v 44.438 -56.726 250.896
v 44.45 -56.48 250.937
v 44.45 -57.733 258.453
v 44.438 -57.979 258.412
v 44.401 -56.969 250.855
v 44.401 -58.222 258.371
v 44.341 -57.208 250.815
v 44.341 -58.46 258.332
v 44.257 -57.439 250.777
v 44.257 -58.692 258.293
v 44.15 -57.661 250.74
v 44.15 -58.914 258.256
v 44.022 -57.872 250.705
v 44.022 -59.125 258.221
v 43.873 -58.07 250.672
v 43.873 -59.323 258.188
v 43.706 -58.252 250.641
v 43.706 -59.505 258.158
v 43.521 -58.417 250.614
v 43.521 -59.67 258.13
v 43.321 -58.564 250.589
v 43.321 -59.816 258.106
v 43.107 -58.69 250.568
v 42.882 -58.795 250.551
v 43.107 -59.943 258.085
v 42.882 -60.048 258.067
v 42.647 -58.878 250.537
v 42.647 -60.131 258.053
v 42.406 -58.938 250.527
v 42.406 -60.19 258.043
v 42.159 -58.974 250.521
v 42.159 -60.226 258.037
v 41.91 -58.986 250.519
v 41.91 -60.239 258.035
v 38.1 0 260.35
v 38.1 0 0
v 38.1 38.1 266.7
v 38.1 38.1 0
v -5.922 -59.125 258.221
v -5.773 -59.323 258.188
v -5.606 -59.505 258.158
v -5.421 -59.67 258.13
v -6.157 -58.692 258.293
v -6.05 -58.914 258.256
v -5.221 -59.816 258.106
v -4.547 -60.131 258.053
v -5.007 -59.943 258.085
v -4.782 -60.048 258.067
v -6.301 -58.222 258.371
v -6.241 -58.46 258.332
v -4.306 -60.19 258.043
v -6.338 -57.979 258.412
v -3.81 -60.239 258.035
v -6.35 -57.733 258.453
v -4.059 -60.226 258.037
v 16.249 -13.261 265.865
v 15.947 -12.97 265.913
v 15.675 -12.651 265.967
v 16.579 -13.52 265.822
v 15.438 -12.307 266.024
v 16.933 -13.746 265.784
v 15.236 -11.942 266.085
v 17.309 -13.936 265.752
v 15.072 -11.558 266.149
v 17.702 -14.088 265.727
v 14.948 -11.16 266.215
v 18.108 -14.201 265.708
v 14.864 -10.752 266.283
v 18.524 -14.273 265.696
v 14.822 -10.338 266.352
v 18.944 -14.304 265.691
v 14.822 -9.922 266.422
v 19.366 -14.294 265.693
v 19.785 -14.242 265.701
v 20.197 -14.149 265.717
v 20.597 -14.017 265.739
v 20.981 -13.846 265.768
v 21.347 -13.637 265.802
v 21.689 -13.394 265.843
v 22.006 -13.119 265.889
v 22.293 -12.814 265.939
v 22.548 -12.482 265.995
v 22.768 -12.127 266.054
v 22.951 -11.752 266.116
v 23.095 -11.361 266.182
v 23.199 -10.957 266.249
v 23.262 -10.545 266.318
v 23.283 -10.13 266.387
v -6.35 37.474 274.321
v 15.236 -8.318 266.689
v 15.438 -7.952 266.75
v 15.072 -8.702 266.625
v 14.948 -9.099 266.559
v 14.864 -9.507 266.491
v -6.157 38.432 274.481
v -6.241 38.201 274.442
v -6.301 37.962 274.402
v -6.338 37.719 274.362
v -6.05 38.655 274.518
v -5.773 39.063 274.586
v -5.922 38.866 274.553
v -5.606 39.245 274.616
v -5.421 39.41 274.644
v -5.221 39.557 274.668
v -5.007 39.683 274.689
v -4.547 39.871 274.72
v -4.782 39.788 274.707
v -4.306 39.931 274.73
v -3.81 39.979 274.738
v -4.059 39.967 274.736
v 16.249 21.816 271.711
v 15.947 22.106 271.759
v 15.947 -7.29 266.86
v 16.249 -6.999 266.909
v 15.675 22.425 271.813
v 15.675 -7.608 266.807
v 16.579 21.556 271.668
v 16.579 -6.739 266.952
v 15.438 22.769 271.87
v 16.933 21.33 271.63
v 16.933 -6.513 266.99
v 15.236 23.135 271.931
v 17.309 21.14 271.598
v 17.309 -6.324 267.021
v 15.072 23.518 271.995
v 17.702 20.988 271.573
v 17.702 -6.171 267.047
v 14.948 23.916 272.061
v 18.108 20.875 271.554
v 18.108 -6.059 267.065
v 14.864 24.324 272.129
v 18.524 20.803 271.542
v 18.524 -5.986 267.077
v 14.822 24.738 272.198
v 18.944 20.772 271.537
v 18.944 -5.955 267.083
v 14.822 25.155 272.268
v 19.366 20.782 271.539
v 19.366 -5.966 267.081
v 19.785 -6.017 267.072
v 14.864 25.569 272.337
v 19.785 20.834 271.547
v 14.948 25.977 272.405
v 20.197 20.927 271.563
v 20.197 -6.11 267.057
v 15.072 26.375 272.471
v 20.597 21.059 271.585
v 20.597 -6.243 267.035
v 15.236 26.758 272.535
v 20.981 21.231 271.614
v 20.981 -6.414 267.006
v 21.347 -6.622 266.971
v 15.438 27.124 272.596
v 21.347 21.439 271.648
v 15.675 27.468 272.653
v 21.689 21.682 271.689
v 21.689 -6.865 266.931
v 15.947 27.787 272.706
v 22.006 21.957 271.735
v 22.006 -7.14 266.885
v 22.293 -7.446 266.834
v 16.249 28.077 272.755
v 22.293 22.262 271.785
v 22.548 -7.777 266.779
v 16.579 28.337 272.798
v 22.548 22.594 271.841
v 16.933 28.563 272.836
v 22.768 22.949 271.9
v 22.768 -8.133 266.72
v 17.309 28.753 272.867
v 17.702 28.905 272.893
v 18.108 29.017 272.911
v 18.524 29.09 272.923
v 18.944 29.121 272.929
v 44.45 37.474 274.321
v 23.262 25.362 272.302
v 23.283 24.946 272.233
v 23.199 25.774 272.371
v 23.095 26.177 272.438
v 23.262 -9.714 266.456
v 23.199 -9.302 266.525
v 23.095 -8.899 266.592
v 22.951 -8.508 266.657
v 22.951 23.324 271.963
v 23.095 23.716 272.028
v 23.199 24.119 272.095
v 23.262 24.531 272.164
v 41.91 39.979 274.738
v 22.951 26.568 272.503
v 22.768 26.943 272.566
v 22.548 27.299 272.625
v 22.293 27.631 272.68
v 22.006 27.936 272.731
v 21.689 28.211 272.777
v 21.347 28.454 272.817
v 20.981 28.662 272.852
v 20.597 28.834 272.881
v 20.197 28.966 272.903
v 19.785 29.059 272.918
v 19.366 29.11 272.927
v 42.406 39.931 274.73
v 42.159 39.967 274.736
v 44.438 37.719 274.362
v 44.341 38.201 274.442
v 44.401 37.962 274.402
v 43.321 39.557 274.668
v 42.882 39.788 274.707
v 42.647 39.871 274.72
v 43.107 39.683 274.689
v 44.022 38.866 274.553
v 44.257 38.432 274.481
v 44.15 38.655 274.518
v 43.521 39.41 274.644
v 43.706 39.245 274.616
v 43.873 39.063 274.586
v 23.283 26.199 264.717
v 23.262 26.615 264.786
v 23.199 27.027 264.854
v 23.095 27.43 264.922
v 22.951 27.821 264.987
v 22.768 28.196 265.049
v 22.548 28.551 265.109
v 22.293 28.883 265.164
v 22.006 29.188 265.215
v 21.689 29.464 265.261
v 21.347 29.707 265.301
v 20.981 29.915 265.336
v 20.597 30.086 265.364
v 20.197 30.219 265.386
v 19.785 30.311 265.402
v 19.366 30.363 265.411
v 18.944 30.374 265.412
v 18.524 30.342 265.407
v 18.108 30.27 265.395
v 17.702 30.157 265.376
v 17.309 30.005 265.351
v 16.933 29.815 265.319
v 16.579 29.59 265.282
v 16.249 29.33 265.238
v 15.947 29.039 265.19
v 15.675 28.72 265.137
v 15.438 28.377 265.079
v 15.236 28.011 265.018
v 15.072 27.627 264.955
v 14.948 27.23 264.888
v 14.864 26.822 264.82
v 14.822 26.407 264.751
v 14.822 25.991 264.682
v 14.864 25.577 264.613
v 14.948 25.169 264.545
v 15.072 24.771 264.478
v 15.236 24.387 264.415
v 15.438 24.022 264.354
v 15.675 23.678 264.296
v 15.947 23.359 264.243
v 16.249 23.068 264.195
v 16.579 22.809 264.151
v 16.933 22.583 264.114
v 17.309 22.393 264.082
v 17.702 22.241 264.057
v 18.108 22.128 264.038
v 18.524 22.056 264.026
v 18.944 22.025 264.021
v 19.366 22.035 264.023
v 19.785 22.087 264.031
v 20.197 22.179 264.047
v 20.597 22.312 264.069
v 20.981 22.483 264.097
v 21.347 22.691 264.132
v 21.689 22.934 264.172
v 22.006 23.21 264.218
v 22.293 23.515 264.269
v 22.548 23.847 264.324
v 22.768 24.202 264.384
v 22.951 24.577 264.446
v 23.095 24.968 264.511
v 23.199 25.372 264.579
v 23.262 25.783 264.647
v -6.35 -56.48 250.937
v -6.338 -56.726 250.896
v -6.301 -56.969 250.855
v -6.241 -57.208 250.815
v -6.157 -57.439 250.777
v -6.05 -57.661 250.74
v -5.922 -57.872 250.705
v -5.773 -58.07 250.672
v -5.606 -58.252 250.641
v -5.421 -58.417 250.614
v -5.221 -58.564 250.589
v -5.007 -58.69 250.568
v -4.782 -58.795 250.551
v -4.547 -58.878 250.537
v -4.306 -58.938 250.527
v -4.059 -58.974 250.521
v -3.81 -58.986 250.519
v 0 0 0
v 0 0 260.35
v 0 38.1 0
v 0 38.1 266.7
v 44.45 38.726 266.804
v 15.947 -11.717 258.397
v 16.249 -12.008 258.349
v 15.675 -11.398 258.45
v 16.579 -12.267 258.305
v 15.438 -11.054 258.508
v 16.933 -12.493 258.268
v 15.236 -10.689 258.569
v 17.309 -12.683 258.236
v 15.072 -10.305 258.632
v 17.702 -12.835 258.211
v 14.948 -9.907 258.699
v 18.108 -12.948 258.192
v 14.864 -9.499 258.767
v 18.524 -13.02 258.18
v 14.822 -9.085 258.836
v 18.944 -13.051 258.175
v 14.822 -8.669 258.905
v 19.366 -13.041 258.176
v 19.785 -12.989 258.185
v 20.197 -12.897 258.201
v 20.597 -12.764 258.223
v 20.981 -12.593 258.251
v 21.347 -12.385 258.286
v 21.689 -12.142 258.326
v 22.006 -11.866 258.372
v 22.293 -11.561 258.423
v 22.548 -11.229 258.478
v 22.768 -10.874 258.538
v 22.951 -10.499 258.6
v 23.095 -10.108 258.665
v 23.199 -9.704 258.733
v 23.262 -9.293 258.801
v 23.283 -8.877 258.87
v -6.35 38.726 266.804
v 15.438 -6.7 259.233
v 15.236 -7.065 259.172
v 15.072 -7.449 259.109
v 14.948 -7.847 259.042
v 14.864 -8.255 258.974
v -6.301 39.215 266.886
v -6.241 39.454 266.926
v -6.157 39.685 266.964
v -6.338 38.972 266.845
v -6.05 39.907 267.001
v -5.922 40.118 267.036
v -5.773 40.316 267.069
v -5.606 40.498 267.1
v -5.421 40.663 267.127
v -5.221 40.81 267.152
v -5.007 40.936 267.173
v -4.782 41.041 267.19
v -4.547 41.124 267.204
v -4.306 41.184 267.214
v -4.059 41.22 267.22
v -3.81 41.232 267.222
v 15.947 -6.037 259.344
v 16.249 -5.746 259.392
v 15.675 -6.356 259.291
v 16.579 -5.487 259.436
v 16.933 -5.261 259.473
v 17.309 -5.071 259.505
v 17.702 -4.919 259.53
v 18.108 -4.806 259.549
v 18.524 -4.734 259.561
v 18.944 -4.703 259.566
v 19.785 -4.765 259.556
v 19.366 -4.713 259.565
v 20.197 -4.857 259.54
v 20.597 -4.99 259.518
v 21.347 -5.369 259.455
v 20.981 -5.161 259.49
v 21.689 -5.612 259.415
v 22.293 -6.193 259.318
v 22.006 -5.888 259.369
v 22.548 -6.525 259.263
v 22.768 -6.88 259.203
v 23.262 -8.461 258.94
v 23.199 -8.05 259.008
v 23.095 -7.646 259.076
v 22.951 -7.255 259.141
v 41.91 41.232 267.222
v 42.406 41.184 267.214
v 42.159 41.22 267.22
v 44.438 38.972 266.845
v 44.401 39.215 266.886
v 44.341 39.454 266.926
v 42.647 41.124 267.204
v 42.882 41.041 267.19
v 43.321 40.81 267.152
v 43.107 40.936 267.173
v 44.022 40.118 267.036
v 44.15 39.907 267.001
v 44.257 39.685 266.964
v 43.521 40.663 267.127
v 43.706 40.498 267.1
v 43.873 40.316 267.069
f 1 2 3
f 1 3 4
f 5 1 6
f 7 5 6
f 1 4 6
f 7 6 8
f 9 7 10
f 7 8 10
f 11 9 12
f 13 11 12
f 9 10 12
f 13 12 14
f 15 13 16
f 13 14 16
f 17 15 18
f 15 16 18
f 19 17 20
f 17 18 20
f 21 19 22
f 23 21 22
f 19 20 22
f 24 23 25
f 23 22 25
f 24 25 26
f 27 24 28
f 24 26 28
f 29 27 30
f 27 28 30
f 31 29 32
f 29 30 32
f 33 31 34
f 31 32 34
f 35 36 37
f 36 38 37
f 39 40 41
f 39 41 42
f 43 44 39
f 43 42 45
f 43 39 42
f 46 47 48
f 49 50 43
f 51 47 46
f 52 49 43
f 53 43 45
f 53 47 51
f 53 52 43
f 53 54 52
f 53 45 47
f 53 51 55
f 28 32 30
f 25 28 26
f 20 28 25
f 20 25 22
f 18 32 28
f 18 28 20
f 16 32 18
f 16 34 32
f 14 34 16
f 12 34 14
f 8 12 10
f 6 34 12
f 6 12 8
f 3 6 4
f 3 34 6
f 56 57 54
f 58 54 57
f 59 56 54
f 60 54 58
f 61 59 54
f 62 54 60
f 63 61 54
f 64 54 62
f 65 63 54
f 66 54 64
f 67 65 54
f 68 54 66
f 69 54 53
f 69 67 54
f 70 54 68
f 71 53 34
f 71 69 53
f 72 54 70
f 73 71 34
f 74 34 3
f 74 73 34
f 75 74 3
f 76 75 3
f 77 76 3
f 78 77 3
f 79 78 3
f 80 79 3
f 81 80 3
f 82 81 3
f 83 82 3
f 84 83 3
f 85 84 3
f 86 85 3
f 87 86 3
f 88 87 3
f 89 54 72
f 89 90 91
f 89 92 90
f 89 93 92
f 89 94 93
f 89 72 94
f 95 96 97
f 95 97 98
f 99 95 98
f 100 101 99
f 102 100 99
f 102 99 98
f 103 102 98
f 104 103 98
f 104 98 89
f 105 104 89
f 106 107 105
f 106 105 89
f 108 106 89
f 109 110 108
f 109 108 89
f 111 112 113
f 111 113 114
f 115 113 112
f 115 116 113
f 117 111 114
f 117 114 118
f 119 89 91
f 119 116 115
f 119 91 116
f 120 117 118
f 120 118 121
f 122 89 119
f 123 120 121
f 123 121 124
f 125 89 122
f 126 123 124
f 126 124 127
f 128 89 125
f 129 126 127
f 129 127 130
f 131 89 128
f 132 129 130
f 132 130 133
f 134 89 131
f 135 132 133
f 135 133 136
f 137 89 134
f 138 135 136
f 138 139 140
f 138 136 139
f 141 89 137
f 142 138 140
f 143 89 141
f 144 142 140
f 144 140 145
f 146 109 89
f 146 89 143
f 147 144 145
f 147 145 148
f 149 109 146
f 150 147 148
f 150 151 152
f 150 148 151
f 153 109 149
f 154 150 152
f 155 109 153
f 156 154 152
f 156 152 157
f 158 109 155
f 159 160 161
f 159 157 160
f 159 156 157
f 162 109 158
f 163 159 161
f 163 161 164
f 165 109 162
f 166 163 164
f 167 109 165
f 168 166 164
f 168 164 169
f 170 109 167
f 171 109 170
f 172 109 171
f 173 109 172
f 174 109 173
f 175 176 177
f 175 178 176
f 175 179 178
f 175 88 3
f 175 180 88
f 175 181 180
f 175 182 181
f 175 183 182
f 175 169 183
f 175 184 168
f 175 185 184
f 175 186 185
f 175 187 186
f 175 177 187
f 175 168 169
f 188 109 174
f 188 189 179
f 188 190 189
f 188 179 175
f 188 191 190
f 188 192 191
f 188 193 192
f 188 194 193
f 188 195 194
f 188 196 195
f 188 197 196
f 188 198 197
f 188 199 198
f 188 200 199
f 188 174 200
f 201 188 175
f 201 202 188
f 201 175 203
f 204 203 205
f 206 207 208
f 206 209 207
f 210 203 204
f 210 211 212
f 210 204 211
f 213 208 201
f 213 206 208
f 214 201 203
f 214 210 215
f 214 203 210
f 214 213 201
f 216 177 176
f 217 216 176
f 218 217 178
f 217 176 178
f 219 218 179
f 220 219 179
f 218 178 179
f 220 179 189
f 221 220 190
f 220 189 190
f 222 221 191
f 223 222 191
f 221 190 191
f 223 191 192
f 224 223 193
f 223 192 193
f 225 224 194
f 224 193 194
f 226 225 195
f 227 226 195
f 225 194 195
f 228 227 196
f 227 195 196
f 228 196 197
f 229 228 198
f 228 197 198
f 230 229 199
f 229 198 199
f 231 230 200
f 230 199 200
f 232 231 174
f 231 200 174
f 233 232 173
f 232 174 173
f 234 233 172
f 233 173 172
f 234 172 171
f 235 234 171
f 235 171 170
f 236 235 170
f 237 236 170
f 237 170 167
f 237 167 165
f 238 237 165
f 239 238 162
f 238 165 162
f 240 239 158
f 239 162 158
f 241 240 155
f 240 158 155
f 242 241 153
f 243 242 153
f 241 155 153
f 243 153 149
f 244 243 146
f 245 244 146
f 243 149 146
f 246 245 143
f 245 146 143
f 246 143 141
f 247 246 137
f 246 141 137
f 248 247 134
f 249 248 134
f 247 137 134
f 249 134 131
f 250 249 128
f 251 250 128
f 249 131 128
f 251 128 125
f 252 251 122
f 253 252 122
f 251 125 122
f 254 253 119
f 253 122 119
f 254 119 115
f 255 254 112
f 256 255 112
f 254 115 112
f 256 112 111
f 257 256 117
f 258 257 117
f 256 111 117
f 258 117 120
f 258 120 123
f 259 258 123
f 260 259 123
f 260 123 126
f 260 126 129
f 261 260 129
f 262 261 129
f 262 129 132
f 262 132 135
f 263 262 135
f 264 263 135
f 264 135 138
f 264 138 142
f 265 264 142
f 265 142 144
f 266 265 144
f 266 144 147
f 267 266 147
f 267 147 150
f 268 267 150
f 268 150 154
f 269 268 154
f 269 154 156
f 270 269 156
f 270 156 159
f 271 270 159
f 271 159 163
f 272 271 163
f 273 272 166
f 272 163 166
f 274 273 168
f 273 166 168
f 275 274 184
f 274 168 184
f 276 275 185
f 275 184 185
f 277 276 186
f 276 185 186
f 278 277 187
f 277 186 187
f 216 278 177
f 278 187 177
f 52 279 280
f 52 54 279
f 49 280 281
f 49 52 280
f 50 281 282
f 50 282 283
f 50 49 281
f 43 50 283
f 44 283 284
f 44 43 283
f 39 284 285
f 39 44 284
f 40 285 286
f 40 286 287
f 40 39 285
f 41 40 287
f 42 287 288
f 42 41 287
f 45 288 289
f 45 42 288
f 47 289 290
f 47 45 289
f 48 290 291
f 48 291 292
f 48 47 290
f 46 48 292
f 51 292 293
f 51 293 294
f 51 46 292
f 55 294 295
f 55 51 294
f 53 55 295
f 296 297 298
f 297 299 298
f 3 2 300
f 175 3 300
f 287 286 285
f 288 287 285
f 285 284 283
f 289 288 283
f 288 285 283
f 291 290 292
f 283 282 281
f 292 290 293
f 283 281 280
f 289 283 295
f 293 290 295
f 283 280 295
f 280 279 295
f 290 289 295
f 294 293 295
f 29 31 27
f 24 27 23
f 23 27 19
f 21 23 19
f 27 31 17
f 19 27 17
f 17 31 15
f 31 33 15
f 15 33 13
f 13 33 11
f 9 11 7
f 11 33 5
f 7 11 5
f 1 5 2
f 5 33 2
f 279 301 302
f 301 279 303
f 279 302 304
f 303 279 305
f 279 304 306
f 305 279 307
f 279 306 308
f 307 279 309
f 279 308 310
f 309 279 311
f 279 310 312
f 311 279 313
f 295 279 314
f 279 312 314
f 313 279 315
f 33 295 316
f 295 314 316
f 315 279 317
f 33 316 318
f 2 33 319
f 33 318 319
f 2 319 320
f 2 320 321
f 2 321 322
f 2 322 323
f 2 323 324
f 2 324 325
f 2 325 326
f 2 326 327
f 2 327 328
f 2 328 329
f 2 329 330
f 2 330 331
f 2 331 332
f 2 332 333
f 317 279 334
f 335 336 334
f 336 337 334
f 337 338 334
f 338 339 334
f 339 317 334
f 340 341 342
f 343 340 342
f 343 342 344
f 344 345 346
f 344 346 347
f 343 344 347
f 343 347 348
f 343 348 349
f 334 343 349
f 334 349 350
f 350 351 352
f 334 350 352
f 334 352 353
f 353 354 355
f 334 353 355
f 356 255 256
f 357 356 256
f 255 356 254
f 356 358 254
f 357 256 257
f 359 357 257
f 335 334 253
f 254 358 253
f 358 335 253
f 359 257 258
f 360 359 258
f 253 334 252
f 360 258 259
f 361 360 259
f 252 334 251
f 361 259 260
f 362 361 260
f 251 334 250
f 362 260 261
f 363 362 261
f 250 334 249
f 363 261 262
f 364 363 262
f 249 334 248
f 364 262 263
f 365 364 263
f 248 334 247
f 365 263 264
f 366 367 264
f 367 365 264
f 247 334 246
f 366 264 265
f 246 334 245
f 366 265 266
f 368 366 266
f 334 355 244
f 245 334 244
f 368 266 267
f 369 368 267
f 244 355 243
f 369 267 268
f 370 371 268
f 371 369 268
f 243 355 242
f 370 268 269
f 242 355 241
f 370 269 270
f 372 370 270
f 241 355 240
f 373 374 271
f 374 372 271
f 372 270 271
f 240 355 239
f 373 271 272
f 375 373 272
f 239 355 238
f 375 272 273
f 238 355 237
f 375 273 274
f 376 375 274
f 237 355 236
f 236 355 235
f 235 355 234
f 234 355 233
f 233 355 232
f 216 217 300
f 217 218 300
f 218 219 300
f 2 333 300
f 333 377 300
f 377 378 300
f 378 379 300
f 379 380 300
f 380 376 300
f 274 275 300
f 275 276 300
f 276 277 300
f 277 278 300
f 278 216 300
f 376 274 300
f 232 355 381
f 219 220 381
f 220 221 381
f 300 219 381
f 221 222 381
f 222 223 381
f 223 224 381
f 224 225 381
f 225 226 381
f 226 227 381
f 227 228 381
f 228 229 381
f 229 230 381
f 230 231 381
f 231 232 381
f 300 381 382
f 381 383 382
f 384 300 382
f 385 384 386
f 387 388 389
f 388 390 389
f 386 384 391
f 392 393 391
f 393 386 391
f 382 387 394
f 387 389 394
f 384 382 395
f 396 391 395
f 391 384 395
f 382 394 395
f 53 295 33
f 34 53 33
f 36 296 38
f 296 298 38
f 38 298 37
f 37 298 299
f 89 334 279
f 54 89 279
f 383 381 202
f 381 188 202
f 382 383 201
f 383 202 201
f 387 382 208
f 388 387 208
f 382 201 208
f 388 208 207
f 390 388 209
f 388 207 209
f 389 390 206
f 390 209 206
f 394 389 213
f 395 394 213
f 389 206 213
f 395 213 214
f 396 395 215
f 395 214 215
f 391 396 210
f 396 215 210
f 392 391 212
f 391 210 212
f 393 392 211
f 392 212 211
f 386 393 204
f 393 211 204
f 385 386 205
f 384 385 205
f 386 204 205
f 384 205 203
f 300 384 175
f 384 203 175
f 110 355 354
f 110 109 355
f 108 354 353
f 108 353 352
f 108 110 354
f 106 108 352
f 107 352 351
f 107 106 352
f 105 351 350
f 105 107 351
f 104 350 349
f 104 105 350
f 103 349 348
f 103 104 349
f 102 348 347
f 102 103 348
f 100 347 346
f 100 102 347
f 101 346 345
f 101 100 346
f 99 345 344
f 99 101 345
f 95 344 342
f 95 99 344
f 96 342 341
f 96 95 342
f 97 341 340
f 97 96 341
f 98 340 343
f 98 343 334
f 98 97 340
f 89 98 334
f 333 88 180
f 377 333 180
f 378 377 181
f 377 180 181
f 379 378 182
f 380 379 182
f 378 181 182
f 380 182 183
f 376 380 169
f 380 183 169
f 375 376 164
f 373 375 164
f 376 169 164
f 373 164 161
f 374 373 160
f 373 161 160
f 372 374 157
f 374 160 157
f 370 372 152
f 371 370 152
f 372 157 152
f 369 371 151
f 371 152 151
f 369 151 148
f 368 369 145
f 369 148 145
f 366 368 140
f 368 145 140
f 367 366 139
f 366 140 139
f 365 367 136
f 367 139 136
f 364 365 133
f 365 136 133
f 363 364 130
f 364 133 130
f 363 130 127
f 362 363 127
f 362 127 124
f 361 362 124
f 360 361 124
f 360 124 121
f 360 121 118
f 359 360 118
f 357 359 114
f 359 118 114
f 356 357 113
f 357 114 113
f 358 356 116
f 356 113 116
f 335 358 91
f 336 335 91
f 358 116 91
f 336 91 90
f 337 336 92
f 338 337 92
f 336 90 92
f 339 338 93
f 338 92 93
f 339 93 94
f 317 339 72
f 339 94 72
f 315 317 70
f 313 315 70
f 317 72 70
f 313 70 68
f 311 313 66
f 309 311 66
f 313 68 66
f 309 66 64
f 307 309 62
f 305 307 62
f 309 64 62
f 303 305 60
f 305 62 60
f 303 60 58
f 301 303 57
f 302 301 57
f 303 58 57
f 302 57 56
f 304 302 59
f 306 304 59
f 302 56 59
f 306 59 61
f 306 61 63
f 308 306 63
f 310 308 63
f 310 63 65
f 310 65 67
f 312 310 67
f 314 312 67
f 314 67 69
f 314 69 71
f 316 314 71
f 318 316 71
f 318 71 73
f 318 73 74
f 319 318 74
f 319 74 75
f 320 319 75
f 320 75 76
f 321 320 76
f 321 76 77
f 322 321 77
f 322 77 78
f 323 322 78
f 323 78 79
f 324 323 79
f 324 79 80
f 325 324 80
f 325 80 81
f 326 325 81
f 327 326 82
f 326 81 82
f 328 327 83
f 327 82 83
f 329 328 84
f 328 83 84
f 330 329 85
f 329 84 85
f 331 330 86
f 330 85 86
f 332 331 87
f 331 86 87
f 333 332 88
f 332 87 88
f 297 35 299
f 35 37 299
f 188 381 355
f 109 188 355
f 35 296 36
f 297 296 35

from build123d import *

# Parameters (mm, degrees)
F0_W     = 38.1
F0_H     = 260.35
F2_W     = 38.1
F2_H     = 266.7
F5_DEPTH = 7.62
F6_R     = 4.2333333333
F7_DEPTH = 7.62
F8_R     = 2.54


with BuildPart() as f3:
    # F0 (on Front) → F3 section 0
    with BuildSketch(Plane.XZ):
        with Locations((19.05, 130.175)):
            Rectangle(F0_W, F0_H)
    # F2 (on offset) → F3 section 1
    with BuildSketch(Plane.XZ.offset(-38.1)):
        with Locations((19.05, 133.35)):
            Rectangle(F2_W, F2_H)
    loft()


with BuildPart() as f5:
    # F4 (on face) → F5 (new body)
    with BuildSketch(Plane(origin=(0, -42.2189189189, 253.3135135135), x_dir=(1, 0, 0), z_dir=(0, -0.1643989873, 0.9863939238))):
        Polygon((44.45, 84.6018184123), (-6.35, 84.6018184123), (-6.35, 81.4268184123), (-6.35, -16.9981815877), (44.45, -16.9981815877), align=None)
        with BuildLine():
            Line((38.1, 42.8012763449), (0, 42.8012763449))
            add(Edge.make_bspline(
                [(0, 42.8012763449), (0, 81.4268184123)],
                knots=[0, 0, 1, 1], degree=1))
            Line((0, 81.4268184123), (38.1, 81.4268184123))
            add(Edge.make_bspline(
                [(38.1, 42.8012763449), (38.1, 81.4268184123)],
                knots=[0, 0, 1, 1], degree=1))
        make_face(mode=Mode.SUBTRACT)
        with BuildLine():
            add(Edge.make_bspline(
                [(0, 42.8012763449), (0, 81.4268184123)],
                knots=[0, 0, 1, 1], degree=1))
            Line((0, 42.8012763449), (38.1, 42.8012763449))
            add(Edge.make_bspline(
                [(38.1, 42.8012763449), (38.1, 81.4268184123)],
                knots=[0, 0, 1, 1], degree=1))
            Line((38.1, 81.4268184123), (0, 81.4268184123))
        make_face()
    extrude(amount=F5_DEPTH)

    # F6 (on face) → F7 (cut)
    with BuildSketch(Plane(origin=(0, -43.4716392022, 260.8298352131), x_dir=(1, 0, 0), z_dir=(0, -0.1643989873, 0.9863939238))):
        with Locations((19.05, 33.8018184123)):
            Circle(F6_R)
        with Locations((19.05, 69.3618184123)):
            Circle(F6_R)
    extrude(amount=-F7_DEPTH, mode=Mode.SUBTRACT)

    # F8
    f8_edges = [f5.edges().sort_by_distance(p)[0] for p in [
        (44.45, -59.612182, 254.277191),
        (-6.35, -59.612182, 254.277191),
        (-6.35, 40.605441, 270.980128),
        (44.45, 40.605441, 270.980128),
    ]]
    fillet(f8_edges, radius=F8_R)


solid = Compound([f3.part, f5.part])
